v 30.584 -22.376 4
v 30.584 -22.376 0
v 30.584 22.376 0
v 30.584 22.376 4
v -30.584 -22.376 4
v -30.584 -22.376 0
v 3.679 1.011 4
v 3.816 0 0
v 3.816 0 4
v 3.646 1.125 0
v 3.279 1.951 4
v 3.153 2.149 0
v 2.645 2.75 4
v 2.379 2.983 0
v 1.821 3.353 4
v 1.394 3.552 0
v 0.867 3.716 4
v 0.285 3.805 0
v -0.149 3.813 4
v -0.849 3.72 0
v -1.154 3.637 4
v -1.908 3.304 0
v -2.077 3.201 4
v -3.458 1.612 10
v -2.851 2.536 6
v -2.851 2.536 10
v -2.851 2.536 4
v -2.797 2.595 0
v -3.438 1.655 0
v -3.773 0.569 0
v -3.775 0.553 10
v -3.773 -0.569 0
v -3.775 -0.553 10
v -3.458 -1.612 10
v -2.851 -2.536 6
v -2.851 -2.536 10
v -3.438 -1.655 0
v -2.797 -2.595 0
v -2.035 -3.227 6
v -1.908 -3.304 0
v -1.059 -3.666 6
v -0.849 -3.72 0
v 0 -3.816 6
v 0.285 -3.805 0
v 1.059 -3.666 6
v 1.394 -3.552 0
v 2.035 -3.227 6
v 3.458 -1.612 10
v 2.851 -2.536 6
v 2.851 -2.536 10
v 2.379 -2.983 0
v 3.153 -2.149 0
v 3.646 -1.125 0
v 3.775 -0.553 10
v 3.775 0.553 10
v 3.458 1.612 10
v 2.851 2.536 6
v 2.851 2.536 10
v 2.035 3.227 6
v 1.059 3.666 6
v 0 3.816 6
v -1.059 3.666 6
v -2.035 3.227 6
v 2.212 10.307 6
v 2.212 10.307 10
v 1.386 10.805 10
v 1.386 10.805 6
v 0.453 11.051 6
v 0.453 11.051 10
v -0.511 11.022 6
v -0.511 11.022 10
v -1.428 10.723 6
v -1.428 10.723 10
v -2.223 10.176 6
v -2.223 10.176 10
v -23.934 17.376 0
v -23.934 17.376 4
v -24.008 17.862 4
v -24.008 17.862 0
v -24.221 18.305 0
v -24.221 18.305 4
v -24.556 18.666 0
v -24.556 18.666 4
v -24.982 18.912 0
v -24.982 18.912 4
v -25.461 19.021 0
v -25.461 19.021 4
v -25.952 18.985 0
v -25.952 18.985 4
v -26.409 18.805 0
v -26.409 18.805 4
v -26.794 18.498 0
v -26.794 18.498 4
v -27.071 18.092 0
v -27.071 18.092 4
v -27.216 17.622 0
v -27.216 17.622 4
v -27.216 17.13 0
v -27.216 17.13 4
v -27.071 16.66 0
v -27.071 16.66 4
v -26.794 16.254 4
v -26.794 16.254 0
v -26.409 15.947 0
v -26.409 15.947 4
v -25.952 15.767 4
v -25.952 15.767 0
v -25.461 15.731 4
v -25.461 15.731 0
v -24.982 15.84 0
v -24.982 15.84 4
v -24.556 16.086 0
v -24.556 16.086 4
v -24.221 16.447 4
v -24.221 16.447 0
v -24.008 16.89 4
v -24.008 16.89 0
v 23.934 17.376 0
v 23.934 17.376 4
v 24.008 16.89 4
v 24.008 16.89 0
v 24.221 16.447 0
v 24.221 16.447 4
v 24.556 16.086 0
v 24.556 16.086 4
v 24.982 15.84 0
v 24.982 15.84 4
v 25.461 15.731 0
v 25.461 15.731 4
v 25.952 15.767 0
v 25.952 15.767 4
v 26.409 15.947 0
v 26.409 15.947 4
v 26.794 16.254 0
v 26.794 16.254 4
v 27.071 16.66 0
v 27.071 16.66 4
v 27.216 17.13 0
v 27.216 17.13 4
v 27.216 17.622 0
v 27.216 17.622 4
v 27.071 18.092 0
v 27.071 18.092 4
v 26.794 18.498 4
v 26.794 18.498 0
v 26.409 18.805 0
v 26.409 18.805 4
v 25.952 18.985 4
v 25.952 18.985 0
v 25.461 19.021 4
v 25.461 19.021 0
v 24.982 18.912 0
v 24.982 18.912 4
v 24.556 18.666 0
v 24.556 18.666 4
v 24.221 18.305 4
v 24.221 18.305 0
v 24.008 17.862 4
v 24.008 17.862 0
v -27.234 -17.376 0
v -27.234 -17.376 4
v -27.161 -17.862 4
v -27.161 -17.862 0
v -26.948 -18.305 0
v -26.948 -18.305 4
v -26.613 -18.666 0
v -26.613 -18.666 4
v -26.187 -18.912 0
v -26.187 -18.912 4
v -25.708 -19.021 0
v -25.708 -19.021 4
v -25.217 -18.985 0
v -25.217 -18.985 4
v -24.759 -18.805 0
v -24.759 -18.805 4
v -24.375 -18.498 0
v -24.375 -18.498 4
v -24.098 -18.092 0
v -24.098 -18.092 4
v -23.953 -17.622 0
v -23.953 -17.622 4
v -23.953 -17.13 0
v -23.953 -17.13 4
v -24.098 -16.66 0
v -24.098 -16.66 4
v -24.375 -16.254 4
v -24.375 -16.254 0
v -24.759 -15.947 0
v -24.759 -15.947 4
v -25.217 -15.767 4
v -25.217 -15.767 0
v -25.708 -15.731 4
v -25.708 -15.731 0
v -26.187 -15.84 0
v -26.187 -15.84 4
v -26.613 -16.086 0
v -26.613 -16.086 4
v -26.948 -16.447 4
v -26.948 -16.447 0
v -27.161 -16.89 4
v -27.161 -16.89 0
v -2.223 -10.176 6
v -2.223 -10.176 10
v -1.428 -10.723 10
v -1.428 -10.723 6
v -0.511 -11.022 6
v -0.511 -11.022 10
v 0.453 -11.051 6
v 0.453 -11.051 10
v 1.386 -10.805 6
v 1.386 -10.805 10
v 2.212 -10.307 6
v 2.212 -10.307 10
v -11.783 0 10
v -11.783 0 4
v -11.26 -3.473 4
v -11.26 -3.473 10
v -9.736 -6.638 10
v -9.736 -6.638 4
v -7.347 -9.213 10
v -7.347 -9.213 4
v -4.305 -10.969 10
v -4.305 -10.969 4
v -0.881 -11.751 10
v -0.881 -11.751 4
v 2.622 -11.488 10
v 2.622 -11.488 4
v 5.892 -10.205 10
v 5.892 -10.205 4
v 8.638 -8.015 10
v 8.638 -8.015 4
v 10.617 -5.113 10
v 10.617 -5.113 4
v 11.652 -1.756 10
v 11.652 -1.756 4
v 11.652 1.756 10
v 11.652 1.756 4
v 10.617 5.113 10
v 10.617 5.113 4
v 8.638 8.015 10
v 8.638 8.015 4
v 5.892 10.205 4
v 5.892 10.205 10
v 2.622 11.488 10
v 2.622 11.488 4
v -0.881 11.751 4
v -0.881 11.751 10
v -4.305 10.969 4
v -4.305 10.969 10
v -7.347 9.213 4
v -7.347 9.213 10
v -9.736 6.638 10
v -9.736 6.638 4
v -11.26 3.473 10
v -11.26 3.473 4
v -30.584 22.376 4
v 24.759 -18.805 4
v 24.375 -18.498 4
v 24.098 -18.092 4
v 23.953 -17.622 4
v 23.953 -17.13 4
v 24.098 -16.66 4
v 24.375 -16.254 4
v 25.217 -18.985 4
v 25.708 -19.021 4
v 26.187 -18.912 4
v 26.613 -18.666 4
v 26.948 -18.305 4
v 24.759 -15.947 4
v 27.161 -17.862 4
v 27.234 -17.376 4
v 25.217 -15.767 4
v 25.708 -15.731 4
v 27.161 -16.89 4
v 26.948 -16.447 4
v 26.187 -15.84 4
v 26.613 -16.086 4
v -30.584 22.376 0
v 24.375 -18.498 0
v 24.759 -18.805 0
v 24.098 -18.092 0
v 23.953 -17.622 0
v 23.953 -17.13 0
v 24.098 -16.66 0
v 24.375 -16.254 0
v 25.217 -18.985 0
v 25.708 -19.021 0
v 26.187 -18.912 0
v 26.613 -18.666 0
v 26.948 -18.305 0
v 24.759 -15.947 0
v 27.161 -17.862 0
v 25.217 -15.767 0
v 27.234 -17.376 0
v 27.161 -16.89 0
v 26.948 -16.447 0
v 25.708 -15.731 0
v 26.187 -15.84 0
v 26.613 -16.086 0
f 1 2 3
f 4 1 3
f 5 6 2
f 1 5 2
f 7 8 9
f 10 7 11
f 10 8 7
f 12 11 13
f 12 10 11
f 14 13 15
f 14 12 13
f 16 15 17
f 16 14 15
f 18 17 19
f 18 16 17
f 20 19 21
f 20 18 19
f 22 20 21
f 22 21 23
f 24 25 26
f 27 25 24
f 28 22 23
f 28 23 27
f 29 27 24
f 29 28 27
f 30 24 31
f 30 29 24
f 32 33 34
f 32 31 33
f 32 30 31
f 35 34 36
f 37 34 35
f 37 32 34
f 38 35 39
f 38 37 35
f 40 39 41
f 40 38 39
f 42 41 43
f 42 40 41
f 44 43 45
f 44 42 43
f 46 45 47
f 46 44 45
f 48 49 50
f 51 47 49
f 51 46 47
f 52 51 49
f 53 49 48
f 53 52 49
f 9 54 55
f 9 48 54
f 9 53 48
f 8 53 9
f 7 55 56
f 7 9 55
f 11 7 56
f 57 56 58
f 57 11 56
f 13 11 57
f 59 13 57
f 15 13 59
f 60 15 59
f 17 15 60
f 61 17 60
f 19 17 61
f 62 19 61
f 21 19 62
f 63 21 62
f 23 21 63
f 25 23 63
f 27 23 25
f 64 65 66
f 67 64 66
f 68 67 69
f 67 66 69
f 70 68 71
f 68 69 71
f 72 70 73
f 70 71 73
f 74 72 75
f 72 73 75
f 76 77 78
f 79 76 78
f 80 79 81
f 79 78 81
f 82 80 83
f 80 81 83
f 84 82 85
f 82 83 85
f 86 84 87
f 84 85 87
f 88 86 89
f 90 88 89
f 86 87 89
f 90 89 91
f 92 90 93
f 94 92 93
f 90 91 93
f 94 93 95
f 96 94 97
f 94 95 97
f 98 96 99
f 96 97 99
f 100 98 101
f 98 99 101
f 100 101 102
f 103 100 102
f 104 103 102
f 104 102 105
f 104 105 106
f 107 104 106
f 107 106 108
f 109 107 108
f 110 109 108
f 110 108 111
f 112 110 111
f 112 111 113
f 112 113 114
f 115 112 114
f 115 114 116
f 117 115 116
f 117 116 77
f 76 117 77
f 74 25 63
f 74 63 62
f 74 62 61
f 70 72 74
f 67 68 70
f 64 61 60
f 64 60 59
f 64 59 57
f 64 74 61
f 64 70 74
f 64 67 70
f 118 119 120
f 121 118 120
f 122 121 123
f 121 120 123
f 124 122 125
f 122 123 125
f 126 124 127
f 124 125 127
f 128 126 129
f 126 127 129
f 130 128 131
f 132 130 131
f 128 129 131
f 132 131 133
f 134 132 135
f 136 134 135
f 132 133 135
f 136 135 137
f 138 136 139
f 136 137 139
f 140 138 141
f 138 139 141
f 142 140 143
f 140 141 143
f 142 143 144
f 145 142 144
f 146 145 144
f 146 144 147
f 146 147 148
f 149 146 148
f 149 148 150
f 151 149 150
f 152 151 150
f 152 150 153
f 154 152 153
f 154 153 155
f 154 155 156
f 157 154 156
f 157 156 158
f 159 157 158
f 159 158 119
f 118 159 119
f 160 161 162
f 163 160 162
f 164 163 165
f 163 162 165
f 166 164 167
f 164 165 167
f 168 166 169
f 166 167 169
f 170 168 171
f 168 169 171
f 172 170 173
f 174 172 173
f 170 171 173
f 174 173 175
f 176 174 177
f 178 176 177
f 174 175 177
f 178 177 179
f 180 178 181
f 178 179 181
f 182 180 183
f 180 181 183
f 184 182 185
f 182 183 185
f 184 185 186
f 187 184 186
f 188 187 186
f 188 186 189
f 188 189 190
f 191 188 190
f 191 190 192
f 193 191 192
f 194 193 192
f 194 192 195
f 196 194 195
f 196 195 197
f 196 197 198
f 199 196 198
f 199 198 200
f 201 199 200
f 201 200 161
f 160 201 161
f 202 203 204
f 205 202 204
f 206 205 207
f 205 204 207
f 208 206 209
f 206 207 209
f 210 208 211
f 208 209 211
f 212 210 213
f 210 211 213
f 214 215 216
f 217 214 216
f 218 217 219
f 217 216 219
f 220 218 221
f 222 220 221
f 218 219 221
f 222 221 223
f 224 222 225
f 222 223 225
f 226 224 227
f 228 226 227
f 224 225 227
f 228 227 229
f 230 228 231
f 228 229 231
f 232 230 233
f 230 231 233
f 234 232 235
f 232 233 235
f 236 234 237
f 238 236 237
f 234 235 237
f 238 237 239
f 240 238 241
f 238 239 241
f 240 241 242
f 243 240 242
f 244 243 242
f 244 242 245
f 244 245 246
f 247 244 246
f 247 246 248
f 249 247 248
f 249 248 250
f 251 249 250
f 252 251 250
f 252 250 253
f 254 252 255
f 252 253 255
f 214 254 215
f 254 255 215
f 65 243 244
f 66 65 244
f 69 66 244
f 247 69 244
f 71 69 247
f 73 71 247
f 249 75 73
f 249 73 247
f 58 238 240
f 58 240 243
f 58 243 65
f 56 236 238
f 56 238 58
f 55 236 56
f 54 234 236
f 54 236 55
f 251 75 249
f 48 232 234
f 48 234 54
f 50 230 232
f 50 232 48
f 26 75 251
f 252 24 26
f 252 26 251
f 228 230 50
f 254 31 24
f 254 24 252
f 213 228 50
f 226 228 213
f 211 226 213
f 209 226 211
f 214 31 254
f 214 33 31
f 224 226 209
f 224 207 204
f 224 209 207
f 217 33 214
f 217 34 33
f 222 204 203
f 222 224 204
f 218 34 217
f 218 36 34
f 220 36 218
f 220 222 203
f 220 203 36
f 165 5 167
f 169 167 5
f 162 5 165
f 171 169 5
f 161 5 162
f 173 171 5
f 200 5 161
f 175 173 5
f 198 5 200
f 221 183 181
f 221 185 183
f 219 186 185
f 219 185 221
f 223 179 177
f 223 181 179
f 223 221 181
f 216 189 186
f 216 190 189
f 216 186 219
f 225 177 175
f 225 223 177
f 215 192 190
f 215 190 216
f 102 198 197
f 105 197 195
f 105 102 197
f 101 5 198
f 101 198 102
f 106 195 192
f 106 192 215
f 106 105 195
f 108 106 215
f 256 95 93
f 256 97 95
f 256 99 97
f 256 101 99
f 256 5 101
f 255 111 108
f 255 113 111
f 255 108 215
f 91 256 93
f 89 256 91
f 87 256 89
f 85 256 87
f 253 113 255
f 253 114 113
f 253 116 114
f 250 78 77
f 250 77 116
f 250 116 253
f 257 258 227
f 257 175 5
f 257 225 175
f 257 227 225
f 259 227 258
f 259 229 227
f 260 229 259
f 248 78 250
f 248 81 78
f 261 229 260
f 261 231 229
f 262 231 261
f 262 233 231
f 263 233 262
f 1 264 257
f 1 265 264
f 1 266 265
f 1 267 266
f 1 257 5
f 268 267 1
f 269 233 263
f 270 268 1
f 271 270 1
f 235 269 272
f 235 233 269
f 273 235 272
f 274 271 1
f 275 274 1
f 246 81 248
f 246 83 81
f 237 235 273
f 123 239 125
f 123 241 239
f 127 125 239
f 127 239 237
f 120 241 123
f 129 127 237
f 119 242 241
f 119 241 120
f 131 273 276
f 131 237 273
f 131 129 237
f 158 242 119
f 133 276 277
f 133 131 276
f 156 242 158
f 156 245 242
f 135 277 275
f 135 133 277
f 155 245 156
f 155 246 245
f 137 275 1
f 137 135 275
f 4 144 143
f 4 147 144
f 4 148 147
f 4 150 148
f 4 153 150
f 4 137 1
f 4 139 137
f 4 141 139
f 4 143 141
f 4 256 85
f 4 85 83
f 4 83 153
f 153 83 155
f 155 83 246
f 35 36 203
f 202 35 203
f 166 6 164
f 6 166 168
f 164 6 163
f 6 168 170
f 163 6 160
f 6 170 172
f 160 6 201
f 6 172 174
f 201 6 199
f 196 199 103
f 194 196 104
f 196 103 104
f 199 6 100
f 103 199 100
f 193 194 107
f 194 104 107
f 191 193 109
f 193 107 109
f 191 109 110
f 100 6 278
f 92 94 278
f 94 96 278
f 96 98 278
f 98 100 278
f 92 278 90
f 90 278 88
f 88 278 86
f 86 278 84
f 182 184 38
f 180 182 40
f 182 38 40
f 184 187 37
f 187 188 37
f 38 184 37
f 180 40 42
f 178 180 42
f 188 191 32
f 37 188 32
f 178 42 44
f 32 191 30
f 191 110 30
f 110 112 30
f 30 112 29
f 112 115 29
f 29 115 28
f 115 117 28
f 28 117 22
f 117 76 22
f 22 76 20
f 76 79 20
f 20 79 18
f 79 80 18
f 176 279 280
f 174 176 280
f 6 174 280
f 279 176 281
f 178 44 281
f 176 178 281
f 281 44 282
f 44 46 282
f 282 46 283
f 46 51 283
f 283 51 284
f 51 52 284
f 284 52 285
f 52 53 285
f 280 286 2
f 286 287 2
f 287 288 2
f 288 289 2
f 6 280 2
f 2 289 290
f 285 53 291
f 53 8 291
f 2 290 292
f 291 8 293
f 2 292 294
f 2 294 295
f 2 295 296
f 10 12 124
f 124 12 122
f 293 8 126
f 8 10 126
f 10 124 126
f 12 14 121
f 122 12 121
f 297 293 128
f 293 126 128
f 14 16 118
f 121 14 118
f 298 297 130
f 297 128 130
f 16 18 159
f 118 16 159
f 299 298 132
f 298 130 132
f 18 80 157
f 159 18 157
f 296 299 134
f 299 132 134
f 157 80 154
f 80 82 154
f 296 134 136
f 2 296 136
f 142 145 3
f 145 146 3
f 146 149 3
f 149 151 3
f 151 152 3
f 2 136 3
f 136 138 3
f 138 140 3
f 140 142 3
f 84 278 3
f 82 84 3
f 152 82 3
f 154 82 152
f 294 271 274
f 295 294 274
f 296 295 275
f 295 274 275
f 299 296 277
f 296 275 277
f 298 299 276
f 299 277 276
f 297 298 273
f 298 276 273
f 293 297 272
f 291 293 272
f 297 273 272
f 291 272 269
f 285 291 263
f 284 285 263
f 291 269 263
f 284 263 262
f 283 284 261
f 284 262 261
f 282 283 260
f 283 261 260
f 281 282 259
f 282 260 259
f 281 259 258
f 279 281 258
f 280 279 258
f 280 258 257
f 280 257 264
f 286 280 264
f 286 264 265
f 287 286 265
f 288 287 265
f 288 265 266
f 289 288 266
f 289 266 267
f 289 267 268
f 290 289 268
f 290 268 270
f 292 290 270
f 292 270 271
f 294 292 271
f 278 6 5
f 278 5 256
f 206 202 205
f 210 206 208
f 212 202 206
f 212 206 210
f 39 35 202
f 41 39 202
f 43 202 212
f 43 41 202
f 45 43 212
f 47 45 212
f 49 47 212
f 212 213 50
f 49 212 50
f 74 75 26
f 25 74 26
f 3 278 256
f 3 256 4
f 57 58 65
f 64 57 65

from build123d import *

# Parameters (mm, degrees)
ESQUISSE1_W             = 61.168999858
ESQUISSE1_H             = 44.751998484
ESQUISSE1_R             = 3.815511502
BOSS_EXTRU_2_DEPTH      = 4
BOSS_EXTRU_4_START      = 4
ESQUISSE2_R             = 11.783463465
BOSS_EXTRU_4_DEPTH      = 6
ENL_V_MAT_EXTRU_1_DEPTH = 4
ESQUISSE1_2_R           = 3.815511502
ENL_V_MAT_EXTRU_3_DEPTH = 40.193073087
SKETCH1_R               = 1.65
CUT_EXTRUDE1_DEPTH      = 10


with BuildPart() as part:
    # Esquisse1 → Boss.-Extru.2 (new body)
    with BuildSketch(Plane.XY):
        Rectangle(ESQUISSE1_W, ESQUISSE1_H)
        Circle(ESQUISSE1_R, mode=Mode.SUBTRACT)
    extrude(amount=BOSS_EXTRU_2_DEPTH)

    # Esquisse2 → Boss.-Extru.4 (add)
    with BuildSketch(Plane.XY.offset(BOSS_EXTRU_4_START)):
        Circle(ESQUISSE2_R)
    extrude(amount=BOSS_EXTRU_4_DEPTH)

    # Esquisse4 → Enlèv. mat.-Extru.1 (cut)
    with BuildSketch(Plane.XY.offset(10)):
        with BuildLine():
            Line((2.87019869, 2.302904251), (2.212319523, 10.306766943))
            ThreePointArc((2.212319523, 10.306766943), (-0.029730087, 11.070975118), (-2.223029733, 10.17641531))
            Line((-2.223029733, 10.17641531), (-2.870198645, 2.302904307))
            ThreePointArc((-2.870198645, 2.302904307), (-3.679865285, 0), (-2.870198645, -2.302904307))
            Line((-2.870198645, -2.302904307), (-2.223029733, -10.17641531))
            ThreePointArc((-2.223029733, -10.17641531), (-0.029730087, -11.070975118), (2.212319523, -10.306766943))
            Line((2.212319523, -10.306766943), (2.87019869, -2.302904251))
            ThreePointArc((2.87019869, -2.302904251), (3.679865285, 0), (2.87019869, 2.302904251))
        make_face()
    extrude(amount=-ENL_V_MAT_EXTRU_1_DEPTH, mode=Mode.SUBTRACT)

    # Esquisse1<2> → Enlèv. mat.-Extru.3 (cut, through all)
    with BuildSketch(Plane.XY):
        Circle(ESQUISSE1_2_R)
    extrude(amount=ENL_V_MAT_EXTRU_3_DEPTH, mode=Mode.SUBTRACT)

    # Sketch1 → Cut-Extrude1 (cut)
    with BuildSketch(Plane.XY.offset(4)):
        with Locations((-25.584499929, 17.375999242)):
            Circle(SKETCH1_R)
        with Locations((25.584499929, 17.375999242)):
            Circle(SKETCH1_R)
        with Locations((25.584499929, -17.375999242)):
            Circle(SKETCH1_R)
        with Locations((-25.584499929, -17.375999242)):
            Circle(SKETCH1_R)
    extrude(amount=-CUT_EXTRUDE1_DEPTH, mode=Mode.SUBTRACT)


solid = part.part
